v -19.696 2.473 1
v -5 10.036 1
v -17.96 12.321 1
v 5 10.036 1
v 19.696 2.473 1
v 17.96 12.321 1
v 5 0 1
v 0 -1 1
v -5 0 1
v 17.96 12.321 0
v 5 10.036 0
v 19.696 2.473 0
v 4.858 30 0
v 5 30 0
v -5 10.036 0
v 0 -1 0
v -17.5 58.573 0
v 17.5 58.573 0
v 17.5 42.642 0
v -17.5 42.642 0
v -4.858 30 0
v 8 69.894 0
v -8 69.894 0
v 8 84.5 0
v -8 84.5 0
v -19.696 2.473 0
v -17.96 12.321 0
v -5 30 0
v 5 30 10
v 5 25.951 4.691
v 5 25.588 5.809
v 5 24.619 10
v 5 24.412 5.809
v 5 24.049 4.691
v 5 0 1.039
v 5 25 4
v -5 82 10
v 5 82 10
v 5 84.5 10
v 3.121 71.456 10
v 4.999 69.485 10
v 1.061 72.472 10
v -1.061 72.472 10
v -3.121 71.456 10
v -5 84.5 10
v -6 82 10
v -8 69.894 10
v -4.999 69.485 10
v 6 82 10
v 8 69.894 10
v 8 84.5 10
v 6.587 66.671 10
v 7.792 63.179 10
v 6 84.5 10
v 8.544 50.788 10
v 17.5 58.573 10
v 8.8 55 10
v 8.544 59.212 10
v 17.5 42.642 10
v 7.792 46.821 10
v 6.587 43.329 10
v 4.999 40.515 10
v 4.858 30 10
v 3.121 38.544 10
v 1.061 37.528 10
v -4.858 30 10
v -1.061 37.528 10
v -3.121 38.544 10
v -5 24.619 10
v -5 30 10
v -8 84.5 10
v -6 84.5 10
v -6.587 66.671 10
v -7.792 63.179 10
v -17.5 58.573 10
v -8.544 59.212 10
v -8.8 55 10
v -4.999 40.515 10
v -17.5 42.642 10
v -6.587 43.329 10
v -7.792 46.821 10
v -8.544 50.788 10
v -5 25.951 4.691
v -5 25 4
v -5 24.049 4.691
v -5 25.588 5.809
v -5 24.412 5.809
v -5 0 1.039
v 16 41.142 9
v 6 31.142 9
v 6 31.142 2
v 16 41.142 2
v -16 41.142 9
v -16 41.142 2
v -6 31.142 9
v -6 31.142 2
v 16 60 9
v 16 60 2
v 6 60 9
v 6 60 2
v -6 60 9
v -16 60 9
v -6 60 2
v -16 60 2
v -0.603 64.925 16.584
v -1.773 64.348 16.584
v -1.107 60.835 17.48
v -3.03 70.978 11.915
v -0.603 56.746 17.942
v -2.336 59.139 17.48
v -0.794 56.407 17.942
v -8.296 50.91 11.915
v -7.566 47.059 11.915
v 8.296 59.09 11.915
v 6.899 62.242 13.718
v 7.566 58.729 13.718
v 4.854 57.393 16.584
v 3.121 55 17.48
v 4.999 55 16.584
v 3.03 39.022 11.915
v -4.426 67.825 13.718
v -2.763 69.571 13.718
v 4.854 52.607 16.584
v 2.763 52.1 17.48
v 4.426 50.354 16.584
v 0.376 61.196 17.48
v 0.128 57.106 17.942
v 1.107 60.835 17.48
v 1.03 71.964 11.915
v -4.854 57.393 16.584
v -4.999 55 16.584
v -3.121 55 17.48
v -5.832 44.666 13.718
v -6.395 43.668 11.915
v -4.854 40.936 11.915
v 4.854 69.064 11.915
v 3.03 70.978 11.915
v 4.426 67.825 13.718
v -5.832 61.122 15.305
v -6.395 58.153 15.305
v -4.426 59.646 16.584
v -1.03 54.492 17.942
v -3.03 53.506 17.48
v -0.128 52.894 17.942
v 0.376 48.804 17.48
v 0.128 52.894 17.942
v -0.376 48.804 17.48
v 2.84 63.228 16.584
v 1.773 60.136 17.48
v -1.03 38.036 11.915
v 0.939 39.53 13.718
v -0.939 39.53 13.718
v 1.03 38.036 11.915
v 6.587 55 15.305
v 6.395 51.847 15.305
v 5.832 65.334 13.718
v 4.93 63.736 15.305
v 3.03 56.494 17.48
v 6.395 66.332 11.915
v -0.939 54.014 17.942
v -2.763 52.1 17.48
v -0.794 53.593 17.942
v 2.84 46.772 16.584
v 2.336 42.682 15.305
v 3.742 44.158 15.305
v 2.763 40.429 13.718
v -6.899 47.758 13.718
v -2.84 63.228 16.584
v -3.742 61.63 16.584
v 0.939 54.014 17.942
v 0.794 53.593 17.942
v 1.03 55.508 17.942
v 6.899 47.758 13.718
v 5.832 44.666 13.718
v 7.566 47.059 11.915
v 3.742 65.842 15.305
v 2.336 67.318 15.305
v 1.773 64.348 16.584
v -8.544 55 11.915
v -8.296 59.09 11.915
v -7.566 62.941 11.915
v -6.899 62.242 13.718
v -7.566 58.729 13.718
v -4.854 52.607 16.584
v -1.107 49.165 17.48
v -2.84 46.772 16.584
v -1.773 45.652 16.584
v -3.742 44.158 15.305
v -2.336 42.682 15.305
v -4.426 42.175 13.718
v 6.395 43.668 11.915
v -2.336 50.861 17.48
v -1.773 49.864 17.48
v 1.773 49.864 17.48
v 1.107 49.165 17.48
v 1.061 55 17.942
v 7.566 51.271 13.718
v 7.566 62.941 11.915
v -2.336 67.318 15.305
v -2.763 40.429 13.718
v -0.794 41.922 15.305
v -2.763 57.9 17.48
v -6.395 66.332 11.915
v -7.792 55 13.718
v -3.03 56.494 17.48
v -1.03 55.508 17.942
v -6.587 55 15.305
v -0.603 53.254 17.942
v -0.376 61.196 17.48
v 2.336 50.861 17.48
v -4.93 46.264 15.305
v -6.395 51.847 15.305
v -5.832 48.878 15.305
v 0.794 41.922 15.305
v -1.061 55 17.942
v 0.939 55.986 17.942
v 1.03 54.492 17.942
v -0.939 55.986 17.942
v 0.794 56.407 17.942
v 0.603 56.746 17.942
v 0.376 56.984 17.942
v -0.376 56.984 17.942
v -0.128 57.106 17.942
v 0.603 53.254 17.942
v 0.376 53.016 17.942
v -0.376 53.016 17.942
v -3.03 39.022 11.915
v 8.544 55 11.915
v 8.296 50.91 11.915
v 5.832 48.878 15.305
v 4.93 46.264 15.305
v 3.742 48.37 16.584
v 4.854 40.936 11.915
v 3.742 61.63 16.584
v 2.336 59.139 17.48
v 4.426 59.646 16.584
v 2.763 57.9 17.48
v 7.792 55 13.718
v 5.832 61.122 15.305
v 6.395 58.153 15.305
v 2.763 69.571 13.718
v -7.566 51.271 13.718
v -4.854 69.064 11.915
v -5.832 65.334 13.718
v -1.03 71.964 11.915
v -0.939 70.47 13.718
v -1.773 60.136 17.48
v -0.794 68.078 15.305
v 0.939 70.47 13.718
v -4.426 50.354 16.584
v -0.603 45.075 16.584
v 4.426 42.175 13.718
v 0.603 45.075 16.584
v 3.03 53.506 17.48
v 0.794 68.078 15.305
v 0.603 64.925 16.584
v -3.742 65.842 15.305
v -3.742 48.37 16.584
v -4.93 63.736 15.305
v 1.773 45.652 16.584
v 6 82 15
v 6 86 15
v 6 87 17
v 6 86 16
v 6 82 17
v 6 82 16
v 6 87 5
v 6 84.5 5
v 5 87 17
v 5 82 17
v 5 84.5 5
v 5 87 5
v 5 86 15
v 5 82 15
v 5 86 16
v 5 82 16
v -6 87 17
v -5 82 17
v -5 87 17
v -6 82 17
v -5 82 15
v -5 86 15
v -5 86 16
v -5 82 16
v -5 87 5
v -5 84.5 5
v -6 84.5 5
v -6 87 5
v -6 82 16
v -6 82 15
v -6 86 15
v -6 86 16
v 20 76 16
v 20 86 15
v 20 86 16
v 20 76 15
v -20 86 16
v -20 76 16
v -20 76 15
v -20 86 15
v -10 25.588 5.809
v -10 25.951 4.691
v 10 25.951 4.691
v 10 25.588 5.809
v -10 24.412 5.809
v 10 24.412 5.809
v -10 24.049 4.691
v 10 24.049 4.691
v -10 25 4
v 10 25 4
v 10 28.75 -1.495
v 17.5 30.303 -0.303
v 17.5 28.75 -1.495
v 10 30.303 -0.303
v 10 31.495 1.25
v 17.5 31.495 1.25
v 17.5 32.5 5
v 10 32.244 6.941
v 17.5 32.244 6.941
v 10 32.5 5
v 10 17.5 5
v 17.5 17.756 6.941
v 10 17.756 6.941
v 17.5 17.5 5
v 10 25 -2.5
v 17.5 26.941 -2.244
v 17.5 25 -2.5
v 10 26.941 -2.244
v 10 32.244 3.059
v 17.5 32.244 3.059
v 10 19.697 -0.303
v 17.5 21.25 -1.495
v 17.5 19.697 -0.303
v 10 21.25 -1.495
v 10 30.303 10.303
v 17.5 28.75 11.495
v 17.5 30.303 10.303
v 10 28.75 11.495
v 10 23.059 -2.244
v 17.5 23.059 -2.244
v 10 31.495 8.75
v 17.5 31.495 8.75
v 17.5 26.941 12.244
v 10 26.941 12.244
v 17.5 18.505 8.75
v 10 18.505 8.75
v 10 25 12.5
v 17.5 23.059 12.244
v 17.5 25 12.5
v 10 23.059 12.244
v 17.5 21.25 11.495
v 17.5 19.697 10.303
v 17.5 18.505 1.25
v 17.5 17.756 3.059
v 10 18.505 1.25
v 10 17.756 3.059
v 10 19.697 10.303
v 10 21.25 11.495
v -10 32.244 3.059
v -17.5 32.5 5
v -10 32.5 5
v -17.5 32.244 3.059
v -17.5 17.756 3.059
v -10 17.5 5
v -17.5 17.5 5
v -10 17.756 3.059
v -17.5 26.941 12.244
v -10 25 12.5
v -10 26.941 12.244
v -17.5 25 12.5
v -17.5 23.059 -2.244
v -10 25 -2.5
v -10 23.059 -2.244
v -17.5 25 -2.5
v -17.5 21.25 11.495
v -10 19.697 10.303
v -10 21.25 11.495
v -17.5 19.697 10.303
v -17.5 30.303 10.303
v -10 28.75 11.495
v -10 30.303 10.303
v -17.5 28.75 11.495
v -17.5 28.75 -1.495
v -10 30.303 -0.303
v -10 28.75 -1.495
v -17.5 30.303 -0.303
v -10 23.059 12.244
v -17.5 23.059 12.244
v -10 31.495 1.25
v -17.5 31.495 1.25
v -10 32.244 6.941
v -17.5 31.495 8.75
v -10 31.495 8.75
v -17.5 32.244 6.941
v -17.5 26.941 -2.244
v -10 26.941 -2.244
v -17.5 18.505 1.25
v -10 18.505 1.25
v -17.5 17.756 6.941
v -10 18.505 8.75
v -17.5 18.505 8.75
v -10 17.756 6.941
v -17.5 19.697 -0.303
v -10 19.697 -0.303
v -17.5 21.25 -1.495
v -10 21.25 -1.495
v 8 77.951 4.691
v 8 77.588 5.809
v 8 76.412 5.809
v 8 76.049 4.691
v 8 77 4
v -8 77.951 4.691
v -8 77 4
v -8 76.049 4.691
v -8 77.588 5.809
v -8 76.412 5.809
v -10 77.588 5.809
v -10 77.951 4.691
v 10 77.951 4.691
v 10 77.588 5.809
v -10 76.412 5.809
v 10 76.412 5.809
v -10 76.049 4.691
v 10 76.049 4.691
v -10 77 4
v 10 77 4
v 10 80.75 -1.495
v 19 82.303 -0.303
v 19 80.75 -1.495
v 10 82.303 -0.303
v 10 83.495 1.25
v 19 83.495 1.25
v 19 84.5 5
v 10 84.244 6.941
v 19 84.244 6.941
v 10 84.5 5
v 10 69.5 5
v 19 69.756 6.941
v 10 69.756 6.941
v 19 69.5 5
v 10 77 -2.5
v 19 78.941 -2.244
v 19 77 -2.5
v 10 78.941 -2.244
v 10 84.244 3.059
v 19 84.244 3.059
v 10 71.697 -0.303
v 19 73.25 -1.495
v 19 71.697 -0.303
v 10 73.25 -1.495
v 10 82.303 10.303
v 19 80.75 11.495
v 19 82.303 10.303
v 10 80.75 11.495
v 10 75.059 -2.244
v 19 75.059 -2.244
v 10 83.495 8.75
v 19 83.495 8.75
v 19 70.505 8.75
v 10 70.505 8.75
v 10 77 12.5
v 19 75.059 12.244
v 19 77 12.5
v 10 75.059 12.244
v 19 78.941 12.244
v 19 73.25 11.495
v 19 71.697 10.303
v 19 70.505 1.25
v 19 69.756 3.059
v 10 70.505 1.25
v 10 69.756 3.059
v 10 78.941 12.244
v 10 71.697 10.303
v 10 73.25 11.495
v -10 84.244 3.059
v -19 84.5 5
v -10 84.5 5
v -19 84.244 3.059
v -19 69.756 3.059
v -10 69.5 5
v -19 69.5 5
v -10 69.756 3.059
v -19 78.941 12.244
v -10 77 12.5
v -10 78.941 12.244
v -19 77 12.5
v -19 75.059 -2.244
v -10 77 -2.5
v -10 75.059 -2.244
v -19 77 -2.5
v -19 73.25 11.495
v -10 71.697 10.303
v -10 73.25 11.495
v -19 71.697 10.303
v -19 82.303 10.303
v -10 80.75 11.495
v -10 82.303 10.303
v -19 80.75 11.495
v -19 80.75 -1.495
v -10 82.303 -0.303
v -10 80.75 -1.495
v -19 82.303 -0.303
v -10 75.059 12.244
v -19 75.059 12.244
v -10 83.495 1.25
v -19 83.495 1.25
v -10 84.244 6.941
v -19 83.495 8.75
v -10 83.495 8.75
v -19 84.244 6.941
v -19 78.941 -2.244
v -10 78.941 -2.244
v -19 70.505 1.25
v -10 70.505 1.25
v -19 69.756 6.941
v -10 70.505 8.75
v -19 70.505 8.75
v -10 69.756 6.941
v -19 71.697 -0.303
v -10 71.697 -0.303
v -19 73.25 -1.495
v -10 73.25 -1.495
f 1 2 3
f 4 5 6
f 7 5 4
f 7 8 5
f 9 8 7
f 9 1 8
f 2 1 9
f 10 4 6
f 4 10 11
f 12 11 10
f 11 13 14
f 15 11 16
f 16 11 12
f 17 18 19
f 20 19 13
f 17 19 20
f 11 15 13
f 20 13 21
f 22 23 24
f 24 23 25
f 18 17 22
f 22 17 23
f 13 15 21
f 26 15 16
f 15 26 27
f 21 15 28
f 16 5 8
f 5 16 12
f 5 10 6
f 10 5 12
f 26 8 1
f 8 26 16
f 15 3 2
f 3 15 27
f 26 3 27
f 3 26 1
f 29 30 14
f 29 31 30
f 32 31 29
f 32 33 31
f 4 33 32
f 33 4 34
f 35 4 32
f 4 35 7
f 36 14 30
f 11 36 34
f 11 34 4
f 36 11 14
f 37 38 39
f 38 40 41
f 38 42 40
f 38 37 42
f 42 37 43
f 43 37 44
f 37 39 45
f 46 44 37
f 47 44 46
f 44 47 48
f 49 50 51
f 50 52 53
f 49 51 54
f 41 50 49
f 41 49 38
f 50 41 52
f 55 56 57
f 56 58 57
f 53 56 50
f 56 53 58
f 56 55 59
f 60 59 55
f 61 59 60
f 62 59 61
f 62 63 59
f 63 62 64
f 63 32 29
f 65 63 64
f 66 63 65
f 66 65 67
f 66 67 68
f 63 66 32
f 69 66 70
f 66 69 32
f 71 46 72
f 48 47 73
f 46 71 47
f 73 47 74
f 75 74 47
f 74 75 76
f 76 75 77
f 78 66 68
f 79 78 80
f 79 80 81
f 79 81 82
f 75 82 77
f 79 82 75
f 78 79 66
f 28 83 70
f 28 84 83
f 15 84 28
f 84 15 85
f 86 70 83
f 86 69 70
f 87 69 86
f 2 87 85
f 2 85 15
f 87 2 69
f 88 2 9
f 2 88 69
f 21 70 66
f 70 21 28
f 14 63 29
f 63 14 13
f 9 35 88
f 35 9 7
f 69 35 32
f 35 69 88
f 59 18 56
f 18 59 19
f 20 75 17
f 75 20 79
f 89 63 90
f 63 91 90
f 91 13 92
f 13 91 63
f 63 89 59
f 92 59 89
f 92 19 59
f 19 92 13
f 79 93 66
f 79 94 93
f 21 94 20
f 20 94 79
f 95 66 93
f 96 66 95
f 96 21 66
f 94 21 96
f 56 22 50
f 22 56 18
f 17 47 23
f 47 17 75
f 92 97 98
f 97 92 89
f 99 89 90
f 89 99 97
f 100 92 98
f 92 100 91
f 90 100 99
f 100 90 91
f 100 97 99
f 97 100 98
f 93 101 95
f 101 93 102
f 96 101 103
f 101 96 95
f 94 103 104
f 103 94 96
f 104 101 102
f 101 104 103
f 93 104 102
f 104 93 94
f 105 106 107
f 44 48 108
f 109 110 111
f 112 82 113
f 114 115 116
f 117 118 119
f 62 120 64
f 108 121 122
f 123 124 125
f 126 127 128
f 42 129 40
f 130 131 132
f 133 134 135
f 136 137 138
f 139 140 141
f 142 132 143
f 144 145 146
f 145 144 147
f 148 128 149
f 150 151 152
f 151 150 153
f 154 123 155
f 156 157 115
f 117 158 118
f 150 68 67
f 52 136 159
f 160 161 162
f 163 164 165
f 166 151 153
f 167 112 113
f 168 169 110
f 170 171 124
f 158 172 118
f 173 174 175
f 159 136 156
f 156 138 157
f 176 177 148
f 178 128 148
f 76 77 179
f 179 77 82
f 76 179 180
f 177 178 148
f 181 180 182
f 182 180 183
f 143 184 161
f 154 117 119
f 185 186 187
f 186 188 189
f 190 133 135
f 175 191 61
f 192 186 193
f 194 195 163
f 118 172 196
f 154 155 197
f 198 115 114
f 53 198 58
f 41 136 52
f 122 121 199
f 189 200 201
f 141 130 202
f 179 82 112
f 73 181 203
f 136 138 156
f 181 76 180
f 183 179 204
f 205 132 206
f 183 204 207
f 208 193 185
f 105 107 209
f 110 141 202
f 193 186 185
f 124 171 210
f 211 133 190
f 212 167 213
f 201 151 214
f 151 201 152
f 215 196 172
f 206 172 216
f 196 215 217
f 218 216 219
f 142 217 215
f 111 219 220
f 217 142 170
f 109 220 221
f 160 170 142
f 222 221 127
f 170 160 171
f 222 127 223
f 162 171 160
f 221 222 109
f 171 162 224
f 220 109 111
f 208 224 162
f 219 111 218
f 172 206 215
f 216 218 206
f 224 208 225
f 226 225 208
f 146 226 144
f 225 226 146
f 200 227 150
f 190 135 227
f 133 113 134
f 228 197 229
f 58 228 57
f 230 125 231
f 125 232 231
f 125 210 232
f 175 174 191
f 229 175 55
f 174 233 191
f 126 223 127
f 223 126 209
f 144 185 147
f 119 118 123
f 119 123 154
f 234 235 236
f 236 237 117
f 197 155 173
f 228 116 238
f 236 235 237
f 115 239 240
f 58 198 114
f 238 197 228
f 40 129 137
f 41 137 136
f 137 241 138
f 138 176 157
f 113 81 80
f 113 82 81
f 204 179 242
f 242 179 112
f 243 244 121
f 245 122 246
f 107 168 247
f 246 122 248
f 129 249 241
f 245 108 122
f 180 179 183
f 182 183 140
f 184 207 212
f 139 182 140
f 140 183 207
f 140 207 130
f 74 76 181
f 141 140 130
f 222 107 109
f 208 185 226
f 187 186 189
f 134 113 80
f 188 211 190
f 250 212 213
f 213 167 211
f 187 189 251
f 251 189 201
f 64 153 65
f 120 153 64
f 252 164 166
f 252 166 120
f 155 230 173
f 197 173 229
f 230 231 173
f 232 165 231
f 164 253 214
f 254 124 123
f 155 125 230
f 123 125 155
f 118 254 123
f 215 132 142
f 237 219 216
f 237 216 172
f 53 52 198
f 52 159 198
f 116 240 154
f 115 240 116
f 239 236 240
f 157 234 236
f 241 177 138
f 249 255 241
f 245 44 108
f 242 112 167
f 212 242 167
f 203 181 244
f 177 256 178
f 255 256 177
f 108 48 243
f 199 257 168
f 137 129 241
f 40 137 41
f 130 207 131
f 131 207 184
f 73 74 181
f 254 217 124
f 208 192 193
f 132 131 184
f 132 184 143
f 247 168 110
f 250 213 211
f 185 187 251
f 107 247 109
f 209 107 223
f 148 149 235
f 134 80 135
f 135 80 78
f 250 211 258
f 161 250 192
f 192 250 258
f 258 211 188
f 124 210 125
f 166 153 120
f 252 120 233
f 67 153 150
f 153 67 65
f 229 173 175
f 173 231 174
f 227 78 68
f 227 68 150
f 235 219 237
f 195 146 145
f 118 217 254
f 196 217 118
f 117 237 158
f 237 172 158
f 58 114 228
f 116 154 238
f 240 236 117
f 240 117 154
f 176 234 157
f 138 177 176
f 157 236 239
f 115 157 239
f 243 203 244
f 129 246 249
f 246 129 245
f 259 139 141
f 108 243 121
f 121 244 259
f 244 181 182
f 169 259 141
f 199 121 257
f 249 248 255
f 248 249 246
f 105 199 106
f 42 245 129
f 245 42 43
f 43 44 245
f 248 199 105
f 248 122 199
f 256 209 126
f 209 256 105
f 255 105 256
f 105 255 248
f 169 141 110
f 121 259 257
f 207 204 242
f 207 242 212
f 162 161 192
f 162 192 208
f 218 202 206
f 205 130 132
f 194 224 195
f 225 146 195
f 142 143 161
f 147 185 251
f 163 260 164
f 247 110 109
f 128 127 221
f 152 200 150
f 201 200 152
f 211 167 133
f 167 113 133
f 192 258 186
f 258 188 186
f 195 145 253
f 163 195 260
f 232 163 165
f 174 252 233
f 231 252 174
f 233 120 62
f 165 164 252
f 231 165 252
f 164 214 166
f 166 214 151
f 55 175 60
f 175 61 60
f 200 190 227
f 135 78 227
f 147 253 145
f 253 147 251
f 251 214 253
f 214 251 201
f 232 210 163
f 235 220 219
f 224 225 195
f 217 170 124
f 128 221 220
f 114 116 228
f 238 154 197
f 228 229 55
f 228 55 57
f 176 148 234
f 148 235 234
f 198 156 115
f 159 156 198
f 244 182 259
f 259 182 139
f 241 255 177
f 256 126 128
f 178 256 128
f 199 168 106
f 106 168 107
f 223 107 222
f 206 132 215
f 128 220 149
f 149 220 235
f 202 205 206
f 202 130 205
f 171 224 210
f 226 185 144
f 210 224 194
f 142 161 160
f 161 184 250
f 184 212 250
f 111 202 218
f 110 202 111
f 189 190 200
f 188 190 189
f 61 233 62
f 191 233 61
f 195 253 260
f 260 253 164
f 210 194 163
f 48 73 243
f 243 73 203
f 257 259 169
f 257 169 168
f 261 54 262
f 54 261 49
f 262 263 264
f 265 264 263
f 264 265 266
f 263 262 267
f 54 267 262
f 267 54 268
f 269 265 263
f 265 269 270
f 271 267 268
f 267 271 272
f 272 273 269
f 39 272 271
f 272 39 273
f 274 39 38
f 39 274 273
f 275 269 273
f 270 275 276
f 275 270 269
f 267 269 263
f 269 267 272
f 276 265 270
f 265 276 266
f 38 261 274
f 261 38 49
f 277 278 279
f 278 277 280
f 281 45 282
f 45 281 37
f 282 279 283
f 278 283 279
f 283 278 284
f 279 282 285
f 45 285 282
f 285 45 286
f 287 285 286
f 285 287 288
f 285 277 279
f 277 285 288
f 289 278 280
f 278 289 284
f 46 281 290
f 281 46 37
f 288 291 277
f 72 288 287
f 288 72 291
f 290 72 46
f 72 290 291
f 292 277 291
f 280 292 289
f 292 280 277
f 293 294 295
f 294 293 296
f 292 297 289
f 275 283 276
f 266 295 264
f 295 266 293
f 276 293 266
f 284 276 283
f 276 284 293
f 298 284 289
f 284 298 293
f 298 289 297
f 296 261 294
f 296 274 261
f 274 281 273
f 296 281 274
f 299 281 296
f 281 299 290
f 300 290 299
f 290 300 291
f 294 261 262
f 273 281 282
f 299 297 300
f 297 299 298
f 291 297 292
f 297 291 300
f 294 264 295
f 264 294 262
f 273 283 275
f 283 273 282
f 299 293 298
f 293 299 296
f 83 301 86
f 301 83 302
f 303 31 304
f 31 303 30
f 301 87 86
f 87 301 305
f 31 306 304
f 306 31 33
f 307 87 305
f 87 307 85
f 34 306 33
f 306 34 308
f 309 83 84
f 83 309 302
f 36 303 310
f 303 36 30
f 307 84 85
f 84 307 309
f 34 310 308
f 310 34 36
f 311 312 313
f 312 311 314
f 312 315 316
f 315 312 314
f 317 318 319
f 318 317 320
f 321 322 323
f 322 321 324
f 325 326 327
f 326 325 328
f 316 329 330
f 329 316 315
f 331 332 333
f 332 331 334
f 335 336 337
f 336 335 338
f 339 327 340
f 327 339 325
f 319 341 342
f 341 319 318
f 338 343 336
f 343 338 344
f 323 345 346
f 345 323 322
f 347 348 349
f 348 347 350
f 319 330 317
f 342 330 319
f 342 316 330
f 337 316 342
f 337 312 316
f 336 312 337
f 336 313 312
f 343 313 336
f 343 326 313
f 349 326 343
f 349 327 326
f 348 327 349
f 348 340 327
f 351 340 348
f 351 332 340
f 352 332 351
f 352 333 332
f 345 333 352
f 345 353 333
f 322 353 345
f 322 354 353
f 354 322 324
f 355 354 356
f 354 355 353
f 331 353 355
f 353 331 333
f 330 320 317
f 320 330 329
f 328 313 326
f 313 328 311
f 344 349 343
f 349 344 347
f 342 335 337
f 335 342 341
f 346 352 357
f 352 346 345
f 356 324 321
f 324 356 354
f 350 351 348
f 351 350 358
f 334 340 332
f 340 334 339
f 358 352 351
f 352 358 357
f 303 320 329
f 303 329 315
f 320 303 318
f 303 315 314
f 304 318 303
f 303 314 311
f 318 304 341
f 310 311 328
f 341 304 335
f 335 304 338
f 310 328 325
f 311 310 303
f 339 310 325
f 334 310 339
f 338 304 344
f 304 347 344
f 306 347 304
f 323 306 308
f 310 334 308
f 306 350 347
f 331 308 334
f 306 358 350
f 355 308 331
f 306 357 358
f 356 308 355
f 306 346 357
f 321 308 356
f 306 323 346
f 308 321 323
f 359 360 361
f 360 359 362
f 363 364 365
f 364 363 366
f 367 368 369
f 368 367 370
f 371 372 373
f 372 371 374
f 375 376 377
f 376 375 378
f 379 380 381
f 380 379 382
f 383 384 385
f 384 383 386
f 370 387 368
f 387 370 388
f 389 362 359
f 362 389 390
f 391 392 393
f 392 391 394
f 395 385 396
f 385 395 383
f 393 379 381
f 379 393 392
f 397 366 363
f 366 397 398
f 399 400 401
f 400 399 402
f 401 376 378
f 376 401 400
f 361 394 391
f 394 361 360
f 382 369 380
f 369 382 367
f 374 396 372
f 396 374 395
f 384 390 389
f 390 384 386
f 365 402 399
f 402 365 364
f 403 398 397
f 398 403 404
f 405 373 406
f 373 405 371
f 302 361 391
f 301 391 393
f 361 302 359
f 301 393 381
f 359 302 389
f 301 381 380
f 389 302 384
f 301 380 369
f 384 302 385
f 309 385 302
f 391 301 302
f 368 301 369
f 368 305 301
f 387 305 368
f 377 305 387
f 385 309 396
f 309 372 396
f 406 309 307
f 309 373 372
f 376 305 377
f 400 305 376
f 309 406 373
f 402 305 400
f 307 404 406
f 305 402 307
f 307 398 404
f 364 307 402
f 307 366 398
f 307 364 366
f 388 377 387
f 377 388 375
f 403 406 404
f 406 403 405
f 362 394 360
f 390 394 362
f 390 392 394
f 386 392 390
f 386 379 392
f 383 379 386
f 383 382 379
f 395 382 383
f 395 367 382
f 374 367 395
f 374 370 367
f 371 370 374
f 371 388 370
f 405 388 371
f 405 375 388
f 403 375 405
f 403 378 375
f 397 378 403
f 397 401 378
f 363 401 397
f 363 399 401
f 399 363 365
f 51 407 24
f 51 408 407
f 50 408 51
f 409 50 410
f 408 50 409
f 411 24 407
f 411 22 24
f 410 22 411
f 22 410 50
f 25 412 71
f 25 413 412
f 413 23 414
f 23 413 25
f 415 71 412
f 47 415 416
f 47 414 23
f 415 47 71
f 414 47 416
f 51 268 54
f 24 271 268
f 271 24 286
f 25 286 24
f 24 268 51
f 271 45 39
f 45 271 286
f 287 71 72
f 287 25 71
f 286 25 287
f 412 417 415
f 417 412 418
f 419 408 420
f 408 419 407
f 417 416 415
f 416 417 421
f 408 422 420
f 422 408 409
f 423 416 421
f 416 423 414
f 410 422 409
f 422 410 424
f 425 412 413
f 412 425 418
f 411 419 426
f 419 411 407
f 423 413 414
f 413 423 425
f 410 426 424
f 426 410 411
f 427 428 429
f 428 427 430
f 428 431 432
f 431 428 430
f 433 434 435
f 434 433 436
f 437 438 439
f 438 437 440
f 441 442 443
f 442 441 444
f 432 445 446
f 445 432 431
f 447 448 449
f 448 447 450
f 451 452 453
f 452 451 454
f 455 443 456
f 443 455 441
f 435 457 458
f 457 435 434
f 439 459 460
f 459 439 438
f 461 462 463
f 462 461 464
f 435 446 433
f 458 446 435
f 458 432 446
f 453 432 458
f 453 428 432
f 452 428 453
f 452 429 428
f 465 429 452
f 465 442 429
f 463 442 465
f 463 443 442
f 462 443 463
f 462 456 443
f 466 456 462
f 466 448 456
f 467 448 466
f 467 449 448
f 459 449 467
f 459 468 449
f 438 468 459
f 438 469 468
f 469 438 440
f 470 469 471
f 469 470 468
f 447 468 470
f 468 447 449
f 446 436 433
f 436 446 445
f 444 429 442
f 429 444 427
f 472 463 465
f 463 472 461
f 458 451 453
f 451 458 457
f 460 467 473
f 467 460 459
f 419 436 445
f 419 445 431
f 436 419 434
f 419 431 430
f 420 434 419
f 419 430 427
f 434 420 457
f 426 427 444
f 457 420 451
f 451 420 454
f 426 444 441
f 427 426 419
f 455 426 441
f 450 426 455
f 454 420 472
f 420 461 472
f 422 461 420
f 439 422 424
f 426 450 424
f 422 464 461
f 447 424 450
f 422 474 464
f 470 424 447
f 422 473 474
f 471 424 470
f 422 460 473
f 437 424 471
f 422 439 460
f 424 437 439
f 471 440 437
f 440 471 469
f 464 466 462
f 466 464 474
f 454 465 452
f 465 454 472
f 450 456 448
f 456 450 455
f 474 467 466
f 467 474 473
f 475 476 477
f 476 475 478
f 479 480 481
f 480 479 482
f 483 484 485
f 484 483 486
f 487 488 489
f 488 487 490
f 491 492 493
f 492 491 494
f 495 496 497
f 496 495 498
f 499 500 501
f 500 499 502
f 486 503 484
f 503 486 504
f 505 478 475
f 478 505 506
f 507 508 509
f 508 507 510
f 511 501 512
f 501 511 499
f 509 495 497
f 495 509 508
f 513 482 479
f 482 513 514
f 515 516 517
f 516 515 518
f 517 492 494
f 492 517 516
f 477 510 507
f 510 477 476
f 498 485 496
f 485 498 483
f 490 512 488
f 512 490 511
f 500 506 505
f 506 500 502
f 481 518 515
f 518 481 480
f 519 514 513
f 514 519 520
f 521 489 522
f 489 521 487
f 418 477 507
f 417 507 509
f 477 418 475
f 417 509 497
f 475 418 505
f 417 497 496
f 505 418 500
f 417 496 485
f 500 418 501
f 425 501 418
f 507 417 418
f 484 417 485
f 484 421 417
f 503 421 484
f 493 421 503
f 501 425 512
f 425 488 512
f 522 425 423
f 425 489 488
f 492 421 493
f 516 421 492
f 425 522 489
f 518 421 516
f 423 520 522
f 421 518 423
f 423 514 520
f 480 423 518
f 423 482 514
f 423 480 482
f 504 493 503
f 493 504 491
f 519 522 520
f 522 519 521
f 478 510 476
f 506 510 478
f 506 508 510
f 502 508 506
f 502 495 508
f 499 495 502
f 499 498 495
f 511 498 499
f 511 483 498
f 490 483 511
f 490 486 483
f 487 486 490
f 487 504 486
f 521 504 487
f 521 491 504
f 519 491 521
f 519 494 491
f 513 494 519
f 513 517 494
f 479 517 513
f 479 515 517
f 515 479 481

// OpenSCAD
//F1-Car von Christoph Pascal Ahlner (19INB-1)

//Vorderachse mit Reifen
translate([-12.5, 25, 5]) {
    rotate([0, 90, 0]) {
        cylinder(25, 1, 1);
    }
}

translate([10, 25, 5]) {
    rotate([0, 90, 0]) {
        cylinder(7.5, 7.5, 7.5);
    }
}

translate([-10, 25, 5]) {
    rotate([0, -90, 0]) {
        cylinder(7.5, 7.5, 7.5);
    }
}
//Flügel
union(){
    translate([0, -1, 0]) {
        rotate([0, 0, 10]){
            cube([20, 10, 1]);
        }
    }

    mirror([1, 0, 0]) {
        translate([0, -1, 0]) {
            rotate([0, 0, 10]){
                cube([20, 10, 1]);
                }
            }
    }
}
difference() {
    translate([0, 15, 5]){
        cube([10, 30, 10], center = true);
    }
    translate([0, 10, 10]){
        rotate([20, 0, 0])
    cube([11, 30, 10], center = true);
    }
}
//Karosserie
difference(){
    translate([0, 50, 5]) {
        cube([35, 40, 10], center = true);
    }
    translate([10, 21, -0.5]) {
        rotate([0, 0, 45]) {
        cube ([25, 10, 11]);
    }
    }
    mirror([1,0,0]){
        translate([10, 21, -0.5]) {
            rotate([0, 0, 45]) {
                cube ([25, 10, 11]);
            }
        }
    }
    translate([26, 64, -0.5]) {
        rotate([0, 0, 130]) {
            cube ([20, 10, 11]);
        }
    }
    mirror([1,0,0]){
        translate([26, 64, -0.5]) {
    rotate([0, 0, 130]) {
        cube ([20, 10, 11]);
    }
}
    }
    translate([6, 30, 2]) {
        cube([10, 30, 7]);
    }
    mirror([1, 0, 0]){
        translate([6, 30, 2]) {
        cube([10, 30, 7]);
}
    }
}
translate([0, 77, 5]) {
    cube([16, 15, 10], center = true);
}
//Hinterachse mit Reifen
translate([-12.5, 77, 5]) {
    rotate([0, 90, 0]) {
        cylinder(25, 1, 1);
    }
}

translate([10, 77, 5]) {
    rotate([0, 90, 0]) {
        cylinder(9, 7.5, 7.5);
    }
}

translate([-10, 77, 5]) { 
    rotate([0, -90, 0]) {
        cylinder(9, 7.5, 7.5);
    }
}
//Fahrer
translate([0, 55, 10]){
    scale([1.1, 2.2, 1]){
        difference(){
            sphere(8);
            translate([0, 0, -4]){
                cube([16, 16, 8],center = true);
            }
        }
    }   
}

// Spoiler
union() {
    translate([5, 82, 5]){
        cube([1, 5, 12]);
    }
    
    mirror([1, 0, 0]){
        translate([5, 82, 5]){
            cube([1, 5, 12]);
        } 
    }
    
    translate([0, 81, 15.5]){
        cube([40, 10, 1], center = true);
    }
}
